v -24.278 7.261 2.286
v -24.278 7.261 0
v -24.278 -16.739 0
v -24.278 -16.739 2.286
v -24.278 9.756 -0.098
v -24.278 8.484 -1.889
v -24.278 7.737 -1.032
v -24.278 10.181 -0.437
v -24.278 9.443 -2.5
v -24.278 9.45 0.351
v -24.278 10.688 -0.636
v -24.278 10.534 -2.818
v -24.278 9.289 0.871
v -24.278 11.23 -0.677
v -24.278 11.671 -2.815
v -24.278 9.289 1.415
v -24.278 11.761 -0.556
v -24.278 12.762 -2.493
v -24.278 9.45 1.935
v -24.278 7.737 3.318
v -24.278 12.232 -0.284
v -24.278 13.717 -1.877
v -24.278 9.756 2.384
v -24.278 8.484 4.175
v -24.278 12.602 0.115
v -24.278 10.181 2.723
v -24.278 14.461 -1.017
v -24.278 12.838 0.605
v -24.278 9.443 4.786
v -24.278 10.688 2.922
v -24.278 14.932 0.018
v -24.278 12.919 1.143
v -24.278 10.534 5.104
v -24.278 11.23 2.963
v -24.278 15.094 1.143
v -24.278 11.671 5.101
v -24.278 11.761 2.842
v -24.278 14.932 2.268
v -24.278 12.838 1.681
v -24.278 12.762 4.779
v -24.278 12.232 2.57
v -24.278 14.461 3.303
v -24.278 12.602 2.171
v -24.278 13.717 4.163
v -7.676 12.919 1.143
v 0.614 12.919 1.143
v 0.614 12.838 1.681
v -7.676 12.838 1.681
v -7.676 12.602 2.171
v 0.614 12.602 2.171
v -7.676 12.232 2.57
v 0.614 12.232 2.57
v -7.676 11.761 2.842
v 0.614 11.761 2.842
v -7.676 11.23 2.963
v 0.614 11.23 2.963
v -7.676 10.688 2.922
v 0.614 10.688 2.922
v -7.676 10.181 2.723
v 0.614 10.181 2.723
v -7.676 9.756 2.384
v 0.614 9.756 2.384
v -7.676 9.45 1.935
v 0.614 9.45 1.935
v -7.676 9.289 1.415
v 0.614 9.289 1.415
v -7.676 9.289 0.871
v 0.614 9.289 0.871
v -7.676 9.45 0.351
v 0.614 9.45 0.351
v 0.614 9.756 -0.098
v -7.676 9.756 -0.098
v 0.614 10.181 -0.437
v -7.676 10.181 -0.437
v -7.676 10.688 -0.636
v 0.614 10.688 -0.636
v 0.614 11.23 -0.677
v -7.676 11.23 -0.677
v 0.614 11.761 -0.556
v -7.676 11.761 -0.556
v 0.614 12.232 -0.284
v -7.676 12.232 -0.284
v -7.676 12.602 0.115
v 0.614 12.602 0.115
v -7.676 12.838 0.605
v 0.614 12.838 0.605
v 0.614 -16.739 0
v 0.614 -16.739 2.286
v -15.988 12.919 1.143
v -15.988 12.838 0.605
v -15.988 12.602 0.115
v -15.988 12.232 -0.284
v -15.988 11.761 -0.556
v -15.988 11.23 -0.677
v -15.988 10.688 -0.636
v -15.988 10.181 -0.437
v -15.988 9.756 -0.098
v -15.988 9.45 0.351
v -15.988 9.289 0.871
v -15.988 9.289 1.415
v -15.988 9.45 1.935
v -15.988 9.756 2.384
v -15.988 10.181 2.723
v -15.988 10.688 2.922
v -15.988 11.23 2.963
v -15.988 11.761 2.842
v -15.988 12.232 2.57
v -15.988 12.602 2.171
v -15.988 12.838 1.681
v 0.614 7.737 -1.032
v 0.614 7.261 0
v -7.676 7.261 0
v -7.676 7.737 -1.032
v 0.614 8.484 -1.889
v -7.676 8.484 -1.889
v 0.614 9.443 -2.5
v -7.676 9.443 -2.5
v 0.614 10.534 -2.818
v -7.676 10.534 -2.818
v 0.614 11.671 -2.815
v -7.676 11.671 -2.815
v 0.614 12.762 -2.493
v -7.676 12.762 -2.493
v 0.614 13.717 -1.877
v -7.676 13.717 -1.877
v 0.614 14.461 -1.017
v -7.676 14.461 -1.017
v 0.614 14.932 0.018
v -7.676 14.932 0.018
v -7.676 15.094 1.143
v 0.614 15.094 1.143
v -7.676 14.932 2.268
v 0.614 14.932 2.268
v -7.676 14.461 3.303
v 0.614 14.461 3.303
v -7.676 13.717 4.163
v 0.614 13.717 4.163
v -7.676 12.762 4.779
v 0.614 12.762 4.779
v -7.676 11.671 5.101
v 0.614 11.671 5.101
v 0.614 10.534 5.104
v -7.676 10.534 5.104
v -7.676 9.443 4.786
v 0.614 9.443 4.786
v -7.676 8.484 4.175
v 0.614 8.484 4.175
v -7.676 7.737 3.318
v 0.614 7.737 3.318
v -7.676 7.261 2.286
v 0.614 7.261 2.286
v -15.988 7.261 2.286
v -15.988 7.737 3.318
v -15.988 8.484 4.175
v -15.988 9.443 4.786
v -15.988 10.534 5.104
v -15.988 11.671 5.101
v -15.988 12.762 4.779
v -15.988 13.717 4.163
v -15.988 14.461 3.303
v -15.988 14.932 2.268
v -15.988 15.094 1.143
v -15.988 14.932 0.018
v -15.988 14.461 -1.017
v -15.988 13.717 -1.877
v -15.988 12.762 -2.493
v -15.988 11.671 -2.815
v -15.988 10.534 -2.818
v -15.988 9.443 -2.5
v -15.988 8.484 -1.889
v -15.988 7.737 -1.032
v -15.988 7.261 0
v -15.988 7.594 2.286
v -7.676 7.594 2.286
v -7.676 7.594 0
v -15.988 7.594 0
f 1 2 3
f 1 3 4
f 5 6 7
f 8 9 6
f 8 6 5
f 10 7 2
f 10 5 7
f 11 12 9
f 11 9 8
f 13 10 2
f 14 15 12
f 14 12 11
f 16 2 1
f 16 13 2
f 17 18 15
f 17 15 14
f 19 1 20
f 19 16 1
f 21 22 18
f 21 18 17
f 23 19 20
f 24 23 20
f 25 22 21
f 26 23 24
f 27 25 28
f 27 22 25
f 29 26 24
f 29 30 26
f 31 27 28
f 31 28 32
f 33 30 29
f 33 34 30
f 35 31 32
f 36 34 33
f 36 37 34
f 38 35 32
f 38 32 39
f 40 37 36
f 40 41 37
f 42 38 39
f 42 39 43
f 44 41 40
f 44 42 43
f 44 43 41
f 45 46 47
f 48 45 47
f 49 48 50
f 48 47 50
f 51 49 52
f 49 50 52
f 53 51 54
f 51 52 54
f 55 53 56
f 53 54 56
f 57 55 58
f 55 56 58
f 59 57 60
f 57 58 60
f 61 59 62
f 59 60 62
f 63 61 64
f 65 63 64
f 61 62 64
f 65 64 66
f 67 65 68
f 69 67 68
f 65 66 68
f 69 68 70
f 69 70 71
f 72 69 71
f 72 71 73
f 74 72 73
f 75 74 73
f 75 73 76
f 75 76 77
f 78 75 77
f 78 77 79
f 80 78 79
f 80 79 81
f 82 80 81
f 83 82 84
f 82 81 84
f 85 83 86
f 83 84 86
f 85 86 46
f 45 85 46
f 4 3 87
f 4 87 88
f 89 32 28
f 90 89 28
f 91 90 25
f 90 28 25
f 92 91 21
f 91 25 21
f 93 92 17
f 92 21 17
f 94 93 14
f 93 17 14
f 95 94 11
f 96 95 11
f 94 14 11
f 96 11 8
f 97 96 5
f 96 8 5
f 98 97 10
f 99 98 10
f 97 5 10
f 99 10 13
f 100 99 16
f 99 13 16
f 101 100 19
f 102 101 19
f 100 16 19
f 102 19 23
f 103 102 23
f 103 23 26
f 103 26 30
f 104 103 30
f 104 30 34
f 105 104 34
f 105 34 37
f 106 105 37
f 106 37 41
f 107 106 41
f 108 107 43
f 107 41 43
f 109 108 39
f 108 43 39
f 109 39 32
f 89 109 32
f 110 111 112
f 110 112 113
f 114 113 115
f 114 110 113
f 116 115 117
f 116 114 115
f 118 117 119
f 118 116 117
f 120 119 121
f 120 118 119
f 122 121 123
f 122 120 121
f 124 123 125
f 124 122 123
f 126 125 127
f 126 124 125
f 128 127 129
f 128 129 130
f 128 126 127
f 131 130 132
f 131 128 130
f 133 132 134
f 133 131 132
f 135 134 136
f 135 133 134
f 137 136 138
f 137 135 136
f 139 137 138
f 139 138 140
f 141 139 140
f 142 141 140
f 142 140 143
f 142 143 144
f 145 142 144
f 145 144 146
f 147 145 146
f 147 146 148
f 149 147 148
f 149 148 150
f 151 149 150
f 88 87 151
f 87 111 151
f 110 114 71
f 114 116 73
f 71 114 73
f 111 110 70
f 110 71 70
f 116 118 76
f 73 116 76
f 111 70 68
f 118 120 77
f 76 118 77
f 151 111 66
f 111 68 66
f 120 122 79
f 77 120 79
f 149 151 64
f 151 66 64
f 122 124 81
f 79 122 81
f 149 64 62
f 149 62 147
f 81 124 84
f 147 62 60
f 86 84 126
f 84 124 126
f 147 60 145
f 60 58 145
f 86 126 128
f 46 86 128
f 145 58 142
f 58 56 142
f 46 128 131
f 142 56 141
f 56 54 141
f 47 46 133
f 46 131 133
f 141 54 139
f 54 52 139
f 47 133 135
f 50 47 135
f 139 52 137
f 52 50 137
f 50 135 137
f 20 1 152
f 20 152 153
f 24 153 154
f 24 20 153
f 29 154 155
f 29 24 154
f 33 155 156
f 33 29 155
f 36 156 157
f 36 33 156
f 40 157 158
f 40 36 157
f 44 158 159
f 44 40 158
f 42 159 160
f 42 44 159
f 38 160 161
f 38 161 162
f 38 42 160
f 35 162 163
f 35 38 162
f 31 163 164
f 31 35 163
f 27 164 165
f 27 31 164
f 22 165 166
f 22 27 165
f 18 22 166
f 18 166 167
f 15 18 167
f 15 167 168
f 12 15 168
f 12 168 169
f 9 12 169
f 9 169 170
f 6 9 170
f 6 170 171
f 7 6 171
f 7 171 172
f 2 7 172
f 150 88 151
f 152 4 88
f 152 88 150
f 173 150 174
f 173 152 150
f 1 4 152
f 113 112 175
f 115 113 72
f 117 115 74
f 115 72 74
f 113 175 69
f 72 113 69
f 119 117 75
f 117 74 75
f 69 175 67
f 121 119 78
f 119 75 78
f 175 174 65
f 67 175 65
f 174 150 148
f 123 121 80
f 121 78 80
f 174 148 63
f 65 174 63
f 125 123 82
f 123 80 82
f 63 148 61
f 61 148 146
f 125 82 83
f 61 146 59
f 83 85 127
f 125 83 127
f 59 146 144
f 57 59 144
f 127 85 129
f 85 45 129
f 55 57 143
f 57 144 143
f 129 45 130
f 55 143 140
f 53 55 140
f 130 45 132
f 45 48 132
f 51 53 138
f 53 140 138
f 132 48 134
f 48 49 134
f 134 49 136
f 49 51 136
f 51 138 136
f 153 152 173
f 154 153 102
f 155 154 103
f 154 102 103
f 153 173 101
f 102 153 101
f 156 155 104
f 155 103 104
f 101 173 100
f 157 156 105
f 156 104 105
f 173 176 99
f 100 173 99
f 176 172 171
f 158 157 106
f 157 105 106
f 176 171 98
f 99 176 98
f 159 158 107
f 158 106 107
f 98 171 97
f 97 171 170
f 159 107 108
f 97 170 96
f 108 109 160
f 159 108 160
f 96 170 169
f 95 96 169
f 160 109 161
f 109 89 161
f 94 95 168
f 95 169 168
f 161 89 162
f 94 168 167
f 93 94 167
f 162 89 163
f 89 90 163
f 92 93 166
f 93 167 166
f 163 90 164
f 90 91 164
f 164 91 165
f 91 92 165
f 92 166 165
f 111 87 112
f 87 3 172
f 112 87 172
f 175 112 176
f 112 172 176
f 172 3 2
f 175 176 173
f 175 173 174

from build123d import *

# Parameters (mm, degrees)
SKETCH1_W           = 24.892
SKETCH1_H           = 7.874
BOSS_EXTRUDE1_DEPTH = 2.286
SKETCH2_R           = 4
BOSS_EXTRUDE2_DEPTH = 8.29
SKETCH3_R           = 1.825
CUT_EXTRUDE1_DEPTH  = 8.29
SKETCH4_R           = 4
BOSS_EXTRUDE3_DEPTH = 8.29
SKETCH5_R           = 1.825
CUT_EXTRUDE2_DEPTH  = 8.29
SKETCH7_W           = 2.286
SKETCH7_H           = 24
BOSS_EXTRUDE4_DEPTH = 24.892


with BuildPart() as part:
    # Sketch1 → Boss-Extrude1 (new body)
    with BuildSketch(Plane.XY):
        with Locations((-11.83196875, 3.65678125)):
            Rectangle(SKETCH1_W, SKETCH1_H)
    extrude(amount=BOSS_EXTRUDE1_DEPTH)

    # Sketch4 → Boss-Extrude3 (add)
    with BuildSketch(Plane.ZY.offset(24.27796875)):
        with Locations(Location((1.143, 11.09378125, 0), (0, 0, 90))):
            Circle(SKETCH4_R)
    extrude(amount=-BOSS_EXTRUDE3_DEPTH)

    # Sketch5 → Cut-Extrude2 (cut)
    with BuildSketch(Plane.ZY.offset(24.27796875)):
        with Locations(Location((1.143, 11.09378125, 0), (0, 0, 90))):
            Circle(SKETCH5_R)
    extrude(amount=-CUT_EXTRUDE2_DEPTH, mode=Mode.SUBTRACT)



with BuildPart() as body_2:
    # Sketch2 → Boss-Extrude2 (new body)
    with BuildSketch(Plane(origin=(0.61403125, 0, 0), x_dir=(0, 0, -1), z_dir=(1, 0, 0))):
        with Locations(Location((-1.143, 11.09378125, 0), (0, 0, 90))):
            Circle(SKETCH2_R)
    extrude(amount=-BOSS_EXTRUDE2_DEPTH)

    # Sketch3 → Cut-Extrude1 (cut)
    with BuildSketch(Plane(origin=(0.61403125, 0, 0), x_dir=(0, 0, -1), z_dir=(1, 0, 0))):
        with Locations(Location((-1.143, 11.09378125, 0), (0, 0, 90))):
            Circle(SKETCH3_R)
    extrude(amount=-CUT_EXTRUDE1_DEPTH, mode=Mode.SUBTRACT)


with BuildPart() as part_1:
    add(part.part)

    add(body_2.part)  # Boss-Extrude4 merges body 2
    # Sketch7 → Boss-Extrude4 (add)
    with BuildSketch(Plane.ZY.offset(24.27796875)):
        with Locations((1.143, -4.739435545)):
            Rectangle(SKETCH7_W, SKETCH7_H)
    extrude(amount=-BOSS_EXTRUDE4_DEPTH)


solid = part_1.part
